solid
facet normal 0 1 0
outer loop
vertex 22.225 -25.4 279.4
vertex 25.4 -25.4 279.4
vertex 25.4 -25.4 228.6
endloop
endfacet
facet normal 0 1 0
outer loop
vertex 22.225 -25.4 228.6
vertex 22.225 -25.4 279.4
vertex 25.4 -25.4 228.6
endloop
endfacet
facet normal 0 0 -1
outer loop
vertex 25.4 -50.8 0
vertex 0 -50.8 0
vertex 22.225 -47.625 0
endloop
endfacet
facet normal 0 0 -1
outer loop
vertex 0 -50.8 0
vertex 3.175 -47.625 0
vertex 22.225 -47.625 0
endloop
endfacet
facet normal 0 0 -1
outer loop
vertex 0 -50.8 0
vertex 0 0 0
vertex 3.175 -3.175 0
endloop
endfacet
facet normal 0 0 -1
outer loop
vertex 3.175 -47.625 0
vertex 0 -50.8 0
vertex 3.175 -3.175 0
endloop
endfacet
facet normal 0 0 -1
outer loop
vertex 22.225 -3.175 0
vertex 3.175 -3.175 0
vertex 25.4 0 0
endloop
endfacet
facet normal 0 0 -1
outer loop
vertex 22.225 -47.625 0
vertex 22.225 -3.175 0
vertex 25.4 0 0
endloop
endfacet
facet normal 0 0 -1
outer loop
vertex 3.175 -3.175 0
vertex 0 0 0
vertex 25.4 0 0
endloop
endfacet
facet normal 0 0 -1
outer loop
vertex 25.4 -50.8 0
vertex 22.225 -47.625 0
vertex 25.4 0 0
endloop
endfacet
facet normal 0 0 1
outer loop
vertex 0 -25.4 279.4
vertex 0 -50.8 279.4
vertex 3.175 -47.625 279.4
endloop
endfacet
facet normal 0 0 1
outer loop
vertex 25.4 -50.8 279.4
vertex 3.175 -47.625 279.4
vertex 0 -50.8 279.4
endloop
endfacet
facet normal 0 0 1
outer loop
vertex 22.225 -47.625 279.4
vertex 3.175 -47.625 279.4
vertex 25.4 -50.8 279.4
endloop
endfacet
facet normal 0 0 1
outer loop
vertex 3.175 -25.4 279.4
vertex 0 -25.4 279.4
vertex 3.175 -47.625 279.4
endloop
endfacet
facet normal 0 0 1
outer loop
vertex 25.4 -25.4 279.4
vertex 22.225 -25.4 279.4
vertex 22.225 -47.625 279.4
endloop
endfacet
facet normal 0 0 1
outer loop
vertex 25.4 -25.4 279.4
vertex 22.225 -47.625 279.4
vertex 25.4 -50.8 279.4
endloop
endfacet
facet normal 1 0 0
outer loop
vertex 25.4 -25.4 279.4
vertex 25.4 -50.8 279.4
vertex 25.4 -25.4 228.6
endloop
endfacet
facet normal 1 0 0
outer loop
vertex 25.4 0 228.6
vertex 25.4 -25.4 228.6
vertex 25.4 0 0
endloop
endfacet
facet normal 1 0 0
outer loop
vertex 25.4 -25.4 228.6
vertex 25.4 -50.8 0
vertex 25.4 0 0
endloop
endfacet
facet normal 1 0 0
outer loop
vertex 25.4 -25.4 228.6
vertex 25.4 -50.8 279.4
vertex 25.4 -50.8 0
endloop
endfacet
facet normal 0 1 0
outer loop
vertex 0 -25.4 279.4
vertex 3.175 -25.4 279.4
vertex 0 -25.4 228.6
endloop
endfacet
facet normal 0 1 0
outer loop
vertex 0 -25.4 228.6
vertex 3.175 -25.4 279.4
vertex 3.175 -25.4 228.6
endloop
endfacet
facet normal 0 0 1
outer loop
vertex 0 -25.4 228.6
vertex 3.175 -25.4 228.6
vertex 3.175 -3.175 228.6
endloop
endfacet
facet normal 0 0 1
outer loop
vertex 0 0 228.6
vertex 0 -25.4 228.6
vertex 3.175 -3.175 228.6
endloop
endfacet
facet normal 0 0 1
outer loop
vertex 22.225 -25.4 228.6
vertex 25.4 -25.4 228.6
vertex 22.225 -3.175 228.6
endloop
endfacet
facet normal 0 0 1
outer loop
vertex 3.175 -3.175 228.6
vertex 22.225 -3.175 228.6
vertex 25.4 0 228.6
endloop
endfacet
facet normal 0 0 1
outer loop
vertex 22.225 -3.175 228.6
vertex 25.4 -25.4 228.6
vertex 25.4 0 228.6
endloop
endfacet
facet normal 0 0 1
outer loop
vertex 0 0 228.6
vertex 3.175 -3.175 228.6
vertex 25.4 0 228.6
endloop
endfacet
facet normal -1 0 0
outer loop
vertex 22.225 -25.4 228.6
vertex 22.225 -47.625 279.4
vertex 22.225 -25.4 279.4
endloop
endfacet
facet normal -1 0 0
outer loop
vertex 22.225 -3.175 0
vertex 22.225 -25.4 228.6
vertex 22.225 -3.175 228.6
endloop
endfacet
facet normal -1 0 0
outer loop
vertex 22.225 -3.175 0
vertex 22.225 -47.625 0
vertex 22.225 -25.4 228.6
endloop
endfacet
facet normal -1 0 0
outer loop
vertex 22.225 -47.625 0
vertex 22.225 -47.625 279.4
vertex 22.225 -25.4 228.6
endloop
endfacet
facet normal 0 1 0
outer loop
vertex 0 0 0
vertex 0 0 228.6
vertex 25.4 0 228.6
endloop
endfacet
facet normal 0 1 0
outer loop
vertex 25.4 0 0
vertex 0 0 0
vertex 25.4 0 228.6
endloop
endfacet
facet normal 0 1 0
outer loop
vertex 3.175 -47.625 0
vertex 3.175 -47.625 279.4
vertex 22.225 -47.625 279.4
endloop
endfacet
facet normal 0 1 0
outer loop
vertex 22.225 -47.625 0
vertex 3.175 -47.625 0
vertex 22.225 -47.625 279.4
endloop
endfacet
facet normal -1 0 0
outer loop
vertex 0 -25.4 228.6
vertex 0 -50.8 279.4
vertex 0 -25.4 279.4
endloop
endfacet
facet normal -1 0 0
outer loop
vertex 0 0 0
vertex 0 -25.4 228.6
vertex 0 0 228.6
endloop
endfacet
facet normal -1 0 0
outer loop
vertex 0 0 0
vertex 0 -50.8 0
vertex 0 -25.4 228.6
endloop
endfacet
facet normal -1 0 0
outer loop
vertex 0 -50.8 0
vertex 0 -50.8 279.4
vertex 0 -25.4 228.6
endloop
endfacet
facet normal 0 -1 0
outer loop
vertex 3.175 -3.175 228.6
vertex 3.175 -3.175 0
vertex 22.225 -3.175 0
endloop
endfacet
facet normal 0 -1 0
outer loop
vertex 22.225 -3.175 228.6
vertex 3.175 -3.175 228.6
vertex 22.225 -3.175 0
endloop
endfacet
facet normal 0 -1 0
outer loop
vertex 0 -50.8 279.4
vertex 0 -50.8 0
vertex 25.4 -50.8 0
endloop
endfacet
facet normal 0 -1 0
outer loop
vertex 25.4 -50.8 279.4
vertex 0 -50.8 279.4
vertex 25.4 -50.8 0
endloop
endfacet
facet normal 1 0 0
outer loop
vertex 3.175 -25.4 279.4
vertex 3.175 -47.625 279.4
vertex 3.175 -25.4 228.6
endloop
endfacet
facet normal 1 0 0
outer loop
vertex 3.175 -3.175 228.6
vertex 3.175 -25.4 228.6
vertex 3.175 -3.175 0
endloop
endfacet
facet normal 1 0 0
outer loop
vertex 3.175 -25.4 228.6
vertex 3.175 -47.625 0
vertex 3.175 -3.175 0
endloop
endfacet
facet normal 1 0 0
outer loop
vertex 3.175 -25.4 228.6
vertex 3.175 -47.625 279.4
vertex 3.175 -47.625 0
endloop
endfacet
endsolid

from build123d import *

# Parameters (mm, degrees)
SKETCH1_W           = 25.4
SKETCH1_H           = 50.8
SKETCH1_W_2         = 19.05
SKETCH1_H_2         = 44.45
BOSS_EXTRUDE1_DEPTH = 279.4
CUT_EXTRUDE1_REACH  = 287.114
SKETCH2_W           = 50.8
SKETCH2_H           = 25.4


with BuildPart() as part:
    # Sketch1 → Boss-Extrude1 (new body)
    with BuildSketch(Plane.XY):
        with Locations((12.7, -25.4)):
            Rectangle(SKETCH1_W, SKETCH1_H)
        with Locations((12.7, -25.4)):
            Rectangle(SKETCH1_W_2, SKETCH1_H_2, mode=Mode.SUBTRACT)
    extrude(amount=BOSS_EXTRUDE1_DEPTH)

    # Cut-Extrude1: up to this face of the body (flat: up to its plane)
    cut_extrude1_end = Plane(part.part.faces().sort_by_distance((0, -25.4, 139.7))[0])
    # Sketch2 → Cut-Extrude1 (cut, up to the picked face)
    with BuildSketch(Plane(origin=(25.4, 0, 0), x_dir=(0, 0, -1), z_dir=(1, 0, 0)), mode=Mode.PRIVATE) as cut_extrude1_sk1:
        with Locations((-254, -12.7)):
            Rectangle(SKETCH2_W, SKETCH2_H)
    cut_extrude1_tool1 = split(extrude(cut_extrude1_sk1.sketch, amount=-CUT_EXTRUDE1_REACH, mode=Mode.PRIVATE), bisect_by=cut_extrude1_end, keep=Keep.BOTH, mode=Mode.PRIVATE)
    add(cut_extrude1_tool1.solids().sort_by(Axis((25.4, -12.7, 254), (-1, 0, 0)))[0], mode=Mode.SUBTRACT)


solid = part.part
